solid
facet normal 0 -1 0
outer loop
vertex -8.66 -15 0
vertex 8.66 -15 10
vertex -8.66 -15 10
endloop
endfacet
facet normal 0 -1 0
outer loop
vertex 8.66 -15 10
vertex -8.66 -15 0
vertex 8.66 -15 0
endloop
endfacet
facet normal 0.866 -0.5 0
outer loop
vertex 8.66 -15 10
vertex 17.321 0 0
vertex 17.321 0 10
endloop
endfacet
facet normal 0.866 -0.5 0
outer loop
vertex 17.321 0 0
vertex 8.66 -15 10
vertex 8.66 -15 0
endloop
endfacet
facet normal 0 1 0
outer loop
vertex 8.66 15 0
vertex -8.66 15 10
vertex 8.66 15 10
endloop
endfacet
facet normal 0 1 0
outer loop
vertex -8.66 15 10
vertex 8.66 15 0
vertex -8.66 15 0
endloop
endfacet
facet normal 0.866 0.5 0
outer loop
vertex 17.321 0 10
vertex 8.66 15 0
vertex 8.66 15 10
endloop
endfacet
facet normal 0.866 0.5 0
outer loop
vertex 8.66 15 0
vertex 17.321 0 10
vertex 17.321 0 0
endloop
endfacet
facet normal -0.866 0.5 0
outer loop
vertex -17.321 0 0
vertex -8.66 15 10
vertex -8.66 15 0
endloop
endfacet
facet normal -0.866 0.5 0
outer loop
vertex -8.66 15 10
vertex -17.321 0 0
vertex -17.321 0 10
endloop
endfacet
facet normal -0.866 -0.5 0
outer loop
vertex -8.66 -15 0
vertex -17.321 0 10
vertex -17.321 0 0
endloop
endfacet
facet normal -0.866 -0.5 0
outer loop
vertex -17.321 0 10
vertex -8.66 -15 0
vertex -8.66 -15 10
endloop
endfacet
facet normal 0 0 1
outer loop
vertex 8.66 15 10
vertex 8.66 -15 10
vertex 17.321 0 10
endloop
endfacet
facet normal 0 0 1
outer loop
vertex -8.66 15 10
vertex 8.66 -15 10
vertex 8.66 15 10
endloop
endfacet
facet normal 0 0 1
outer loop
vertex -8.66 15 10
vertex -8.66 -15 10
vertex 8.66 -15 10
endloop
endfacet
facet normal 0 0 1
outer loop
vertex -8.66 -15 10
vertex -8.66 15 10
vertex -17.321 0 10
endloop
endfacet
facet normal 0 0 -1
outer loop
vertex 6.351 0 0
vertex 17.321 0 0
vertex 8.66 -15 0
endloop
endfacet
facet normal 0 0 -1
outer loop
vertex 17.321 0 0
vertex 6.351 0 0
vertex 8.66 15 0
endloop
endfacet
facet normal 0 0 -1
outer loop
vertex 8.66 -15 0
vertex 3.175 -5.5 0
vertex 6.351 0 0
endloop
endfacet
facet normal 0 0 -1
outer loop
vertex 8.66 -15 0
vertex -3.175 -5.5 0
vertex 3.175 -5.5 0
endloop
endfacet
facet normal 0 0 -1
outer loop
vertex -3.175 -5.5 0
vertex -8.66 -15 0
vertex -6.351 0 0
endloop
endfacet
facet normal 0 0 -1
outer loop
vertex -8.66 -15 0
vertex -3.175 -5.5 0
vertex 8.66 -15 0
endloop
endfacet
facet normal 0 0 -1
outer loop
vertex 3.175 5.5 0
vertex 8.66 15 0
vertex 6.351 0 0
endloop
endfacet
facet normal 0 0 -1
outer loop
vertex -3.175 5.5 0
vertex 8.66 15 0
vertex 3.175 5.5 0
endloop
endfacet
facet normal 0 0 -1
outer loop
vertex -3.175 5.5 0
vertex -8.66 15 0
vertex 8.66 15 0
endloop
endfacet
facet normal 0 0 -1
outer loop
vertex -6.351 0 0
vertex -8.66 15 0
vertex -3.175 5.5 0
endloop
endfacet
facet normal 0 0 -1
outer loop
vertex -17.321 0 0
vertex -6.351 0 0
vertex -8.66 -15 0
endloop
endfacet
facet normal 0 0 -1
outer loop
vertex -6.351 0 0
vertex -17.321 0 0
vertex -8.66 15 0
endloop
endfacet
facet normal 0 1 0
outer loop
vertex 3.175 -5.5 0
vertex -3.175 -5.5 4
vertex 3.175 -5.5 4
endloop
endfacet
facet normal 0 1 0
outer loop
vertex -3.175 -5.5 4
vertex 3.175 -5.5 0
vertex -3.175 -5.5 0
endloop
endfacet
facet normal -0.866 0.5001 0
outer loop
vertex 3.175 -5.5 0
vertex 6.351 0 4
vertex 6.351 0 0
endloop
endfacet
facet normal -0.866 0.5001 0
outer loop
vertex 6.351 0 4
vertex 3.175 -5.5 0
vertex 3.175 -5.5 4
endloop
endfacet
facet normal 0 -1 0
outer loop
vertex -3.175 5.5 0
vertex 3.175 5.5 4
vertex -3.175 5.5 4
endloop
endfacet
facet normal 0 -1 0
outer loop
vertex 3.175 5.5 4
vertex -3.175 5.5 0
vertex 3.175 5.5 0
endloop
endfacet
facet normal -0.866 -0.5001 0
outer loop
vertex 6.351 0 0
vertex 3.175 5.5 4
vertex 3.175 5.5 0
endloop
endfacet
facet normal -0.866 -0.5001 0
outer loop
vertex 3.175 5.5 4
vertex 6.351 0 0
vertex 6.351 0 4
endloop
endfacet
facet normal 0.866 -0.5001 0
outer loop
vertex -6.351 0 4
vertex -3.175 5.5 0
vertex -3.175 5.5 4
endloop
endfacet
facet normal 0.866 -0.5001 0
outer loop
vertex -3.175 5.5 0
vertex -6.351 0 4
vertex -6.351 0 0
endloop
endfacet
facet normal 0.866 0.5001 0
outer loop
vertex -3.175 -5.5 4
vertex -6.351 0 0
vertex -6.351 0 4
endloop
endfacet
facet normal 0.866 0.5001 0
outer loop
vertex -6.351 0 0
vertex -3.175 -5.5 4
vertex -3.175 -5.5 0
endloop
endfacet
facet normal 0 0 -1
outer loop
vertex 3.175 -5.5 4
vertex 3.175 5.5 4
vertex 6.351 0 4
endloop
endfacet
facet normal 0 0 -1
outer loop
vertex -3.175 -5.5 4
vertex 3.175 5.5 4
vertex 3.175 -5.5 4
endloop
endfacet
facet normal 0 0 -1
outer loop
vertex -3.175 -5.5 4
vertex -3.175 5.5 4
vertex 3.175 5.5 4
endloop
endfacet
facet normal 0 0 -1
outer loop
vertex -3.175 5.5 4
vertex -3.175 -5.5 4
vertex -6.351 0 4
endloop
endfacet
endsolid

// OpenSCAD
BOLT_HEAD_SIZE = 11;
BOLT_HEAD_DEPTH = 4;
KNOB_DIAMETER = 30;
KNOB_DEPTH = 10;
KNOB_SIDES = 6; //4=square, 6=hexagon, etc

difference()
{
	cylinder_outer(KNOB_DEPTH,KNOB_DIAMETER/2,KNOB_SIDES);
	cylinder_outer(BOLT_HEAD_DEPTH,BOLT_HEAD_SIZE/2,6);
	
}


module cylinder_outer(height,radius,fn){
   fudge = 1/cos(180/fn);
   cylinder(h=height,r=radius*fudge,$fn=fn);}
